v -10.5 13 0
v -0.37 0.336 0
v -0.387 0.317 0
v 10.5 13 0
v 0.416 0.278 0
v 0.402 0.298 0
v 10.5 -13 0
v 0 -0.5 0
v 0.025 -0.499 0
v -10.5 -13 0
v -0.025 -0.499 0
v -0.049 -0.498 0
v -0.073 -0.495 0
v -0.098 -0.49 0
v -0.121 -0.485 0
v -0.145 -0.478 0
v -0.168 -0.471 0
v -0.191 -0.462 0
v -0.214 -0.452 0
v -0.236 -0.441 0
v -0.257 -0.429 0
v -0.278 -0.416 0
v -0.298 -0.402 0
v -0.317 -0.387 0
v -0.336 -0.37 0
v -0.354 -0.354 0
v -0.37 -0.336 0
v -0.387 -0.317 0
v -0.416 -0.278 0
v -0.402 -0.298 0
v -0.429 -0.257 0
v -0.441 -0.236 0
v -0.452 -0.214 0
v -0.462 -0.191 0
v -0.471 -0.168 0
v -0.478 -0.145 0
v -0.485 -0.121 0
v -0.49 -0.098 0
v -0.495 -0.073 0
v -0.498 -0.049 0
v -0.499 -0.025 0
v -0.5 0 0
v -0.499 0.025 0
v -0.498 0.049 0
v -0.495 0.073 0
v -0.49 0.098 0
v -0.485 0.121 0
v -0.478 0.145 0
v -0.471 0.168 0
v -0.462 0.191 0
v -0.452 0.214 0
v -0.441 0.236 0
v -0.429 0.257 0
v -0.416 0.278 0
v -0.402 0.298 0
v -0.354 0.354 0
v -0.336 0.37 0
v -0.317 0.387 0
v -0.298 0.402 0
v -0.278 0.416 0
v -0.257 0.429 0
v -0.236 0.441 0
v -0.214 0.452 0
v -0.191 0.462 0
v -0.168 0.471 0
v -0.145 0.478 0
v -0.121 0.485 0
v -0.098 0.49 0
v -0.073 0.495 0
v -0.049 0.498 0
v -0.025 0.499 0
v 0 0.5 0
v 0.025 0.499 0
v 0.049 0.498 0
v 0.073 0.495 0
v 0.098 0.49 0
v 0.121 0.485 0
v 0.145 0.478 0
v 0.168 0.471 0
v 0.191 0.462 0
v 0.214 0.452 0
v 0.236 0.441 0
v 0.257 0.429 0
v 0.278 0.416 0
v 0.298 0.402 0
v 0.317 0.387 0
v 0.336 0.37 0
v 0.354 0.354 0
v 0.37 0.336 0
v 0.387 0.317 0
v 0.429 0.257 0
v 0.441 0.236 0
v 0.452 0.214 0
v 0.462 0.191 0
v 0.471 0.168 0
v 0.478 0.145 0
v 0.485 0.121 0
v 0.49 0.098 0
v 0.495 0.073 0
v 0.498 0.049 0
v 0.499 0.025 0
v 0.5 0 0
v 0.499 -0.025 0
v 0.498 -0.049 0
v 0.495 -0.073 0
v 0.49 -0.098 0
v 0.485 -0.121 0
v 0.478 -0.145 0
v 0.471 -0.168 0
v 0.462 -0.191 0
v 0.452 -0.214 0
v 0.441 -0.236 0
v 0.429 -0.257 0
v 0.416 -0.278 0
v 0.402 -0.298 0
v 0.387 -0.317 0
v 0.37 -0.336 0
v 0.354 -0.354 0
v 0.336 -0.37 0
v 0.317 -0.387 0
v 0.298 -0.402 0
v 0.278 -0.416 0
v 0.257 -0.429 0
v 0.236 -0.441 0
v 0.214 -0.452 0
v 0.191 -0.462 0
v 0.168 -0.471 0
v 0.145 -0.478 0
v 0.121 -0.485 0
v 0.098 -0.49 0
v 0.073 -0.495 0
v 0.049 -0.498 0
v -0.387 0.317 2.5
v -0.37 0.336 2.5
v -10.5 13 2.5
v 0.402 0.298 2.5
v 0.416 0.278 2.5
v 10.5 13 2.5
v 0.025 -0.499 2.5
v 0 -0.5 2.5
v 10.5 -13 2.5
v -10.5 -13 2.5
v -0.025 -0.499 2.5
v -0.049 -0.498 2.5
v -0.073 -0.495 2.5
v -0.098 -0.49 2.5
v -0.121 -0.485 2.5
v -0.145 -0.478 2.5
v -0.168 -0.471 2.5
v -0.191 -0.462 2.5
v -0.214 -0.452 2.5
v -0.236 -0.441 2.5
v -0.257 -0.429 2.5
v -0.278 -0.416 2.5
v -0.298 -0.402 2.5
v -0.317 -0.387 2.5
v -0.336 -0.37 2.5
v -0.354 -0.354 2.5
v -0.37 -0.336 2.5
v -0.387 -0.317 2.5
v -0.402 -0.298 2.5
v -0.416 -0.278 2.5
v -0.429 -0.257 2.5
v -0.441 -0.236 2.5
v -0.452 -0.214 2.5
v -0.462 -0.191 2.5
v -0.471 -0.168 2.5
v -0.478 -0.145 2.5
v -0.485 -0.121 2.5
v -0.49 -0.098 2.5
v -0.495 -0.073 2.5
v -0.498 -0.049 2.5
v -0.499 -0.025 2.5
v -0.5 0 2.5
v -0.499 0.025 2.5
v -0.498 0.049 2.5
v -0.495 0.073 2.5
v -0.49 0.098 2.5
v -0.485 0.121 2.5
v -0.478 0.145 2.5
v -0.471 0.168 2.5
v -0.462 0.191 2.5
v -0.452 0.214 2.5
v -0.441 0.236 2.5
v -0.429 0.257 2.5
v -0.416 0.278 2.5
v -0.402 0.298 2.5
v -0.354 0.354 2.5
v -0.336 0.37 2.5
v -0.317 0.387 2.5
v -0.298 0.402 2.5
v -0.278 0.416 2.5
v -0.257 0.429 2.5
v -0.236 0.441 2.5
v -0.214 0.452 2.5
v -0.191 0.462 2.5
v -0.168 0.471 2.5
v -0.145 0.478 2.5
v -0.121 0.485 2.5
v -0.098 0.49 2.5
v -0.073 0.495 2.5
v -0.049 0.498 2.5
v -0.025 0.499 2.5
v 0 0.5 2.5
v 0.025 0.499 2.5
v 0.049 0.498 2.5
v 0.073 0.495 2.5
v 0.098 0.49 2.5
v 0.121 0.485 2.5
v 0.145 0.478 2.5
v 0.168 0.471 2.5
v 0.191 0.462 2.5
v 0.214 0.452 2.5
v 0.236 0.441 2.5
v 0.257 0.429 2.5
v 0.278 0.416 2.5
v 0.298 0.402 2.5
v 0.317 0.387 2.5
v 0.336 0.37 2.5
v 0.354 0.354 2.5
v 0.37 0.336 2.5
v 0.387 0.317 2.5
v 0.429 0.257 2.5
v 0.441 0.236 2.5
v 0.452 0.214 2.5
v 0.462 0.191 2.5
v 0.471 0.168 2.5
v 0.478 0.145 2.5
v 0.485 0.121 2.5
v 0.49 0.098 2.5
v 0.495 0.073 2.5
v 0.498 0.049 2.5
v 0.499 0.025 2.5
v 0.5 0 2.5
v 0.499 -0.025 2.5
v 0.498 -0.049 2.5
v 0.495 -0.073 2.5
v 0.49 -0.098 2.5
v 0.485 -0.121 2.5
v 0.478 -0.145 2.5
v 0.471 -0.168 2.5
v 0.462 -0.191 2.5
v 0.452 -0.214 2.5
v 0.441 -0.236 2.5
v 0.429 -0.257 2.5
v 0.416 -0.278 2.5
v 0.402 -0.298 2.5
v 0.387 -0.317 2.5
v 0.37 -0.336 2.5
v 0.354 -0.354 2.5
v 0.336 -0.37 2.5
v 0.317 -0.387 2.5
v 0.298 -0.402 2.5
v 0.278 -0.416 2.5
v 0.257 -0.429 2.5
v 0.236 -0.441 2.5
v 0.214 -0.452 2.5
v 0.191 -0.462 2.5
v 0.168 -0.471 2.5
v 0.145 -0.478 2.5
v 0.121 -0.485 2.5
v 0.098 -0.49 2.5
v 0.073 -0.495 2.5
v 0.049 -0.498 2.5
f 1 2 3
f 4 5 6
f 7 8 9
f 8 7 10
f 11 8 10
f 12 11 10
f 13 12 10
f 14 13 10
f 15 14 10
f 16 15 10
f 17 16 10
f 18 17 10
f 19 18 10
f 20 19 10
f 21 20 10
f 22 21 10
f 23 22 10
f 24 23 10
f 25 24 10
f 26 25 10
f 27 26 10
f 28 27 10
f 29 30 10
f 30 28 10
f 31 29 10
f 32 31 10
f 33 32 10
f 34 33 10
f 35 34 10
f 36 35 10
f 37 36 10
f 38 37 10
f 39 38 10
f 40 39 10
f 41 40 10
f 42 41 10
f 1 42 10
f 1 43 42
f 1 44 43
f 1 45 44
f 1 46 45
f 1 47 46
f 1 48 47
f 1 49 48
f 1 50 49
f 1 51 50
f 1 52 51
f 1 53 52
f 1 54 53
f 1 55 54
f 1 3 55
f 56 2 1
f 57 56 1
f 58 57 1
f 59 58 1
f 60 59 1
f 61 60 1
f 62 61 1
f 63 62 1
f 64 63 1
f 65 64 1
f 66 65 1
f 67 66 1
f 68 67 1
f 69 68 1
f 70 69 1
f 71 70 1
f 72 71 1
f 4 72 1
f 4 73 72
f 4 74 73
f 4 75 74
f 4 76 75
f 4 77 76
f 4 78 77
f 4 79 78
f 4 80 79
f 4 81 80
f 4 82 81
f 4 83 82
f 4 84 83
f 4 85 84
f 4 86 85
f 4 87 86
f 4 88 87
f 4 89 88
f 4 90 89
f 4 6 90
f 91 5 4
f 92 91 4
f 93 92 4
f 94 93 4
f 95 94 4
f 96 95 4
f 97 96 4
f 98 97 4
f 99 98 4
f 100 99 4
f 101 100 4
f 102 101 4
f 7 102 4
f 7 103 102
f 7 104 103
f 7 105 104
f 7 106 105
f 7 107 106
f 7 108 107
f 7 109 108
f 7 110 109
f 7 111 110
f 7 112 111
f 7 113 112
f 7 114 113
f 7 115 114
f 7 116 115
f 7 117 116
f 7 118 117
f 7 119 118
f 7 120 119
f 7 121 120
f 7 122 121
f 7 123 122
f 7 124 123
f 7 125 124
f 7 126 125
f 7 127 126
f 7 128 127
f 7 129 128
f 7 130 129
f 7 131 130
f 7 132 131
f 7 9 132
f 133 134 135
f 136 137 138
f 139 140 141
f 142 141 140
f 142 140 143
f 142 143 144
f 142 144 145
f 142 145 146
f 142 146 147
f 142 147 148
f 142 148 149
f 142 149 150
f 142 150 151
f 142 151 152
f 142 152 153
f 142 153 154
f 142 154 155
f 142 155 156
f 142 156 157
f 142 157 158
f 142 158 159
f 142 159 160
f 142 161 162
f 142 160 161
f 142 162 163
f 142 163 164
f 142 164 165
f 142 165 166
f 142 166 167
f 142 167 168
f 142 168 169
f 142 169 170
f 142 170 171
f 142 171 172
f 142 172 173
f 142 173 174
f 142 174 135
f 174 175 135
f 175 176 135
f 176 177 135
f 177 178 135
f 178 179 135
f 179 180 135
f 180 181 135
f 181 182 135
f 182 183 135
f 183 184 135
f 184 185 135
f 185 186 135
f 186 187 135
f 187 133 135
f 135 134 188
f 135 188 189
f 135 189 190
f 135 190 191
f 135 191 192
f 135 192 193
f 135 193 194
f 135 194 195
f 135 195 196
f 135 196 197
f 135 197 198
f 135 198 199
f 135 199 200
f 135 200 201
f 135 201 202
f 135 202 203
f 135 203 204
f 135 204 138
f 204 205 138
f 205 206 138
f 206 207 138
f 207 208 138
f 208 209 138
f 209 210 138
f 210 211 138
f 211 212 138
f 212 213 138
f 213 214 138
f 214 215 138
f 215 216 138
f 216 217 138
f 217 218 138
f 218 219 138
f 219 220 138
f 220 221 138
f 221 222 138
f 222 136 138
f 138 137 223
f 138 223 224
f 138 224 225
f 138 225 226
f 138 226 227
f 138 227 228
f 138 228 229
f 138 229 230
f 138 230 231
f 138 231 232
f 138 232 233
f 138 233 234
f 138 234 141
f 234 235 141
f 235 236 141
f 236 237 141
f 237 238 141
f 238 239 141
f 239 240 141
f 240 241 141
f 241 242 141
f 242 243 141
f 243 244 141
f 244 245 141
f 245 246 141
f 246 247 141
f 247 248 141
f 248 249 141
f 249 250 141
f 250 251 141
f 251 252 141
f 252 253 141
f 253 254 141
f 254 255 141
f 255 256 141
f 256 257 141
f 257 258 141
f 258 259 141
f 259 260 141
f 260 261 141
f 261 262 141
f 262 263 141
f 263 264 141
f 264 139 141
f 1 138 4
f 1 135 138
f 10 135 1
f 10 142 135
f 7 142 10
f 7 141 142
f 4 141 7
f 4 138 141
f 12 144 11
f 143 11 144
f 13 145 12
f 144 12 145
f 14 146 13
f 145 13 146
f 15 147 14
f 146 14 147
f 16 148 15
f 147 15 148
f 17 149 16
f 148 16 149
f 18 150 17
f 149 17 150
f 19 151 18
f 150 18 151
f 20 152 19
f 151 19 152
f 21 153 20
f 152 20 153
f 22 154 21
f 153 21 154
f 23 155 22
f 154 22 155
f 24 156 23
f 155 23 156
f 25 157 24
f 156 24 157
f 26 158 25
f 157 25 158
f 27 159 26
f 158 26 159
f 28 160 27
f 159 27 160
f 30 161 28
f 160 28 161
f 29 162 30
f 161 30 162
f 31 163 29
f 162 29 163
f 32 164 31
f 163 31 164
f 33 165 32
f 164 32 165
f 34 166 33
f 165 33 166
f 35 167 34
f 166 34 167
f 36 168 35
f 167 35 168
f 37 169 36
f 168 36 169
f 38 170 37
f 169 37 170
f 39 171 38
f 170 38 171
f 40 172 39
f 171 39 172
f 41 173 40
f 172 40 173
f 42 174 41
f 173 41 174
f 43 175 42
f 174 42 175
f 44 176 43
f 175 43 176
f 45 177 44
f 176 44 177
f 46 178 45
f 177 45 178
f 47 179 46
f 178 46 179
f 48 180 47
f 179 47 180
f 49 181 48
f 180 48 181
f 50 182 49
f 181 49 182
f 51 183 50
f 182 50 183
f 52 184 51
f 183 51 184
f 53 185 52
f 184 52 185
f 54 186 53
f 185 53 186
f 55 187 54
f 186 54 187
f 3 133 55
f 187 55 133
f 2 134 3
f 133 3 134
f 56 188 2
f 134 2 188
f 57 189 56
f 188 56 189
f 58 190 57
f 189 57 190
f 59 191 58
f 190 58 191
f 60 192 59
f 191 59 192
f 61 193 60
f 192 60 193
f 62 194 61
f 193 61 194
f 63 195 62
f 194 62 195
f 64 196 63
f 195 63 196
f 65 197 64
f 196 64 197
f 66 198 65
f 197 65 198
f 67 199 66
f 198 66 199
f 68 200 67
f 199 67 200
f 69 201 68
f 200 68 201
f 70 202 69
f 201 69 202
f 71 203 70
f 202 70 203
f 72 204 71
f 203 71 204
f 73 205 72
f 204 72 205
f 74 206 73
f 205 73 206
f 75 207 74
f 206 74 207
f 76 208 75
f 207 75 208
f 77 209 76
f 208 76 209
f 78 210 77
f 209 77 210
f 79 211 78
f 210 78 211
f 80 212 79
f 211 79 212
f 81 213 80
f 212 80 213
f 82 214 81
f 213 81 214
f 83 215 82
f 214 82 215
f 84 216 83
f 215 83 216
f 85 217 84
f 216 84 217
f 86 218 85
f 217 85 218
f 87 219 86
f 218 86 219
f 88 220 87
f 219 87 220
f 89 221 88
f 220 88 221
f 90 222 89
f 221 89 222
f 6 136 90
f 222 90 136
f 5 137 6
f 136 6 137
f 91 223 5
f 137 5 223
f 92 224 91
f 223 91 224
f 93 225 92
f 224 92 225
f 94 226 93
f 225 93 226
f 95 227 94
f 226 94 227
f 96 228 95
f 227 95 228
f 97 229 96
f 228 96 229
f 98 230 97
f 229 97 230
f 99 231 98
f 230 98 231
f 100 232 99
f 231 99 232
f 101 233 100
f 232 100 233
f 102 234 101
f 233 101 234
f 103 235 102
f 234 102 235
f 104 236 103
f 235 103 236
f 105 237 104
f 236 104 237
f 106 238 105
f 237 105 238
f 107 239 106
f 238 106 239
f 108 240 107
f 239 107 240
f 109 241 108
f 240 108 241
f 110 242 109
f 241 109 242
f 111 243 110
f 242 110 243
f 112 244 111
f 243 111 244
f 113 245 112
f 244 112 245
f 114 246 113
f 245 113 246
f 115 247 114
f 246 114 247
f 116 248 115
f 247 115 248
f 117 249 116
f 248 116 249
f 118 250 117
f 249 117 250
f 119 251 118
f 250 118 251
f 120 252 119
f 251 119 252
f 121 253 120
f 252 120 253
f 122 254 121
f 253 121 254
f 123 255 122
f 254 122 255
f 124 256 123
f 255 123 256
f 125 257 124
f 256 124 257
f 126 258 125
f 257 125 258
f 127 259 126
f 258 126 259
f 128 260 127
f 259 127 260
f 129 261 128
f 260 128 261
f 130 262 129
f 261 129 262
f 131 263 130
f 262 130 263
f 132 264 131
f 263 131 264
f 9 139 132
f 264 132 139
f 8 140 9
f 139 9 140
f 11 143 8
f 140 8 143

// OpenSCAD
// file: config.scad
$fn = $preview ? 32 : 128;
thread_fn = $preview ? 16 : 128;

INFTSML = 0.0000000000001;

BEAM_SPLITTER_WIDTH = 26;
HOLDER_THICKNESS = 5;

BOLT_HEX_WIDTH = 8.3;
BOLT_HEX_LENGTH = 20;
BOLT_MOUNT_THICKNESS = 3;
BOLT_MOUNT_CAP = 3;

module hexagon(width) {
	diagonal = width * tan(30) + (width / 2) / cos(30);
	polygon(points = [
		[0, diagonal / 2],
		[width / 2,  width * tan(30) / 2],
		[width / 2, -width * tan(30) / 2],
		[0, -diagonal / 2],
		[-width / 2, -width * tan(30) / 2],
		[-width / 2,  width * tan(30) / 2],
	]);
}
// main file
include <config.scad>

module beam_splitter() {
    color("aqua") cube(BEAM_SPLITTER_WIDTH, true);
}

module target() {
    linear_extrude(HOLDER_THICKNESS / 2) difference() {
        square([BEAM_SPLITTER_WIDTH - HOLDER_THICKNESS, BEAM_SPLITTER_WIDTH], true);
        circle(d=1);
    }
}

// beam_splitter();
target();
